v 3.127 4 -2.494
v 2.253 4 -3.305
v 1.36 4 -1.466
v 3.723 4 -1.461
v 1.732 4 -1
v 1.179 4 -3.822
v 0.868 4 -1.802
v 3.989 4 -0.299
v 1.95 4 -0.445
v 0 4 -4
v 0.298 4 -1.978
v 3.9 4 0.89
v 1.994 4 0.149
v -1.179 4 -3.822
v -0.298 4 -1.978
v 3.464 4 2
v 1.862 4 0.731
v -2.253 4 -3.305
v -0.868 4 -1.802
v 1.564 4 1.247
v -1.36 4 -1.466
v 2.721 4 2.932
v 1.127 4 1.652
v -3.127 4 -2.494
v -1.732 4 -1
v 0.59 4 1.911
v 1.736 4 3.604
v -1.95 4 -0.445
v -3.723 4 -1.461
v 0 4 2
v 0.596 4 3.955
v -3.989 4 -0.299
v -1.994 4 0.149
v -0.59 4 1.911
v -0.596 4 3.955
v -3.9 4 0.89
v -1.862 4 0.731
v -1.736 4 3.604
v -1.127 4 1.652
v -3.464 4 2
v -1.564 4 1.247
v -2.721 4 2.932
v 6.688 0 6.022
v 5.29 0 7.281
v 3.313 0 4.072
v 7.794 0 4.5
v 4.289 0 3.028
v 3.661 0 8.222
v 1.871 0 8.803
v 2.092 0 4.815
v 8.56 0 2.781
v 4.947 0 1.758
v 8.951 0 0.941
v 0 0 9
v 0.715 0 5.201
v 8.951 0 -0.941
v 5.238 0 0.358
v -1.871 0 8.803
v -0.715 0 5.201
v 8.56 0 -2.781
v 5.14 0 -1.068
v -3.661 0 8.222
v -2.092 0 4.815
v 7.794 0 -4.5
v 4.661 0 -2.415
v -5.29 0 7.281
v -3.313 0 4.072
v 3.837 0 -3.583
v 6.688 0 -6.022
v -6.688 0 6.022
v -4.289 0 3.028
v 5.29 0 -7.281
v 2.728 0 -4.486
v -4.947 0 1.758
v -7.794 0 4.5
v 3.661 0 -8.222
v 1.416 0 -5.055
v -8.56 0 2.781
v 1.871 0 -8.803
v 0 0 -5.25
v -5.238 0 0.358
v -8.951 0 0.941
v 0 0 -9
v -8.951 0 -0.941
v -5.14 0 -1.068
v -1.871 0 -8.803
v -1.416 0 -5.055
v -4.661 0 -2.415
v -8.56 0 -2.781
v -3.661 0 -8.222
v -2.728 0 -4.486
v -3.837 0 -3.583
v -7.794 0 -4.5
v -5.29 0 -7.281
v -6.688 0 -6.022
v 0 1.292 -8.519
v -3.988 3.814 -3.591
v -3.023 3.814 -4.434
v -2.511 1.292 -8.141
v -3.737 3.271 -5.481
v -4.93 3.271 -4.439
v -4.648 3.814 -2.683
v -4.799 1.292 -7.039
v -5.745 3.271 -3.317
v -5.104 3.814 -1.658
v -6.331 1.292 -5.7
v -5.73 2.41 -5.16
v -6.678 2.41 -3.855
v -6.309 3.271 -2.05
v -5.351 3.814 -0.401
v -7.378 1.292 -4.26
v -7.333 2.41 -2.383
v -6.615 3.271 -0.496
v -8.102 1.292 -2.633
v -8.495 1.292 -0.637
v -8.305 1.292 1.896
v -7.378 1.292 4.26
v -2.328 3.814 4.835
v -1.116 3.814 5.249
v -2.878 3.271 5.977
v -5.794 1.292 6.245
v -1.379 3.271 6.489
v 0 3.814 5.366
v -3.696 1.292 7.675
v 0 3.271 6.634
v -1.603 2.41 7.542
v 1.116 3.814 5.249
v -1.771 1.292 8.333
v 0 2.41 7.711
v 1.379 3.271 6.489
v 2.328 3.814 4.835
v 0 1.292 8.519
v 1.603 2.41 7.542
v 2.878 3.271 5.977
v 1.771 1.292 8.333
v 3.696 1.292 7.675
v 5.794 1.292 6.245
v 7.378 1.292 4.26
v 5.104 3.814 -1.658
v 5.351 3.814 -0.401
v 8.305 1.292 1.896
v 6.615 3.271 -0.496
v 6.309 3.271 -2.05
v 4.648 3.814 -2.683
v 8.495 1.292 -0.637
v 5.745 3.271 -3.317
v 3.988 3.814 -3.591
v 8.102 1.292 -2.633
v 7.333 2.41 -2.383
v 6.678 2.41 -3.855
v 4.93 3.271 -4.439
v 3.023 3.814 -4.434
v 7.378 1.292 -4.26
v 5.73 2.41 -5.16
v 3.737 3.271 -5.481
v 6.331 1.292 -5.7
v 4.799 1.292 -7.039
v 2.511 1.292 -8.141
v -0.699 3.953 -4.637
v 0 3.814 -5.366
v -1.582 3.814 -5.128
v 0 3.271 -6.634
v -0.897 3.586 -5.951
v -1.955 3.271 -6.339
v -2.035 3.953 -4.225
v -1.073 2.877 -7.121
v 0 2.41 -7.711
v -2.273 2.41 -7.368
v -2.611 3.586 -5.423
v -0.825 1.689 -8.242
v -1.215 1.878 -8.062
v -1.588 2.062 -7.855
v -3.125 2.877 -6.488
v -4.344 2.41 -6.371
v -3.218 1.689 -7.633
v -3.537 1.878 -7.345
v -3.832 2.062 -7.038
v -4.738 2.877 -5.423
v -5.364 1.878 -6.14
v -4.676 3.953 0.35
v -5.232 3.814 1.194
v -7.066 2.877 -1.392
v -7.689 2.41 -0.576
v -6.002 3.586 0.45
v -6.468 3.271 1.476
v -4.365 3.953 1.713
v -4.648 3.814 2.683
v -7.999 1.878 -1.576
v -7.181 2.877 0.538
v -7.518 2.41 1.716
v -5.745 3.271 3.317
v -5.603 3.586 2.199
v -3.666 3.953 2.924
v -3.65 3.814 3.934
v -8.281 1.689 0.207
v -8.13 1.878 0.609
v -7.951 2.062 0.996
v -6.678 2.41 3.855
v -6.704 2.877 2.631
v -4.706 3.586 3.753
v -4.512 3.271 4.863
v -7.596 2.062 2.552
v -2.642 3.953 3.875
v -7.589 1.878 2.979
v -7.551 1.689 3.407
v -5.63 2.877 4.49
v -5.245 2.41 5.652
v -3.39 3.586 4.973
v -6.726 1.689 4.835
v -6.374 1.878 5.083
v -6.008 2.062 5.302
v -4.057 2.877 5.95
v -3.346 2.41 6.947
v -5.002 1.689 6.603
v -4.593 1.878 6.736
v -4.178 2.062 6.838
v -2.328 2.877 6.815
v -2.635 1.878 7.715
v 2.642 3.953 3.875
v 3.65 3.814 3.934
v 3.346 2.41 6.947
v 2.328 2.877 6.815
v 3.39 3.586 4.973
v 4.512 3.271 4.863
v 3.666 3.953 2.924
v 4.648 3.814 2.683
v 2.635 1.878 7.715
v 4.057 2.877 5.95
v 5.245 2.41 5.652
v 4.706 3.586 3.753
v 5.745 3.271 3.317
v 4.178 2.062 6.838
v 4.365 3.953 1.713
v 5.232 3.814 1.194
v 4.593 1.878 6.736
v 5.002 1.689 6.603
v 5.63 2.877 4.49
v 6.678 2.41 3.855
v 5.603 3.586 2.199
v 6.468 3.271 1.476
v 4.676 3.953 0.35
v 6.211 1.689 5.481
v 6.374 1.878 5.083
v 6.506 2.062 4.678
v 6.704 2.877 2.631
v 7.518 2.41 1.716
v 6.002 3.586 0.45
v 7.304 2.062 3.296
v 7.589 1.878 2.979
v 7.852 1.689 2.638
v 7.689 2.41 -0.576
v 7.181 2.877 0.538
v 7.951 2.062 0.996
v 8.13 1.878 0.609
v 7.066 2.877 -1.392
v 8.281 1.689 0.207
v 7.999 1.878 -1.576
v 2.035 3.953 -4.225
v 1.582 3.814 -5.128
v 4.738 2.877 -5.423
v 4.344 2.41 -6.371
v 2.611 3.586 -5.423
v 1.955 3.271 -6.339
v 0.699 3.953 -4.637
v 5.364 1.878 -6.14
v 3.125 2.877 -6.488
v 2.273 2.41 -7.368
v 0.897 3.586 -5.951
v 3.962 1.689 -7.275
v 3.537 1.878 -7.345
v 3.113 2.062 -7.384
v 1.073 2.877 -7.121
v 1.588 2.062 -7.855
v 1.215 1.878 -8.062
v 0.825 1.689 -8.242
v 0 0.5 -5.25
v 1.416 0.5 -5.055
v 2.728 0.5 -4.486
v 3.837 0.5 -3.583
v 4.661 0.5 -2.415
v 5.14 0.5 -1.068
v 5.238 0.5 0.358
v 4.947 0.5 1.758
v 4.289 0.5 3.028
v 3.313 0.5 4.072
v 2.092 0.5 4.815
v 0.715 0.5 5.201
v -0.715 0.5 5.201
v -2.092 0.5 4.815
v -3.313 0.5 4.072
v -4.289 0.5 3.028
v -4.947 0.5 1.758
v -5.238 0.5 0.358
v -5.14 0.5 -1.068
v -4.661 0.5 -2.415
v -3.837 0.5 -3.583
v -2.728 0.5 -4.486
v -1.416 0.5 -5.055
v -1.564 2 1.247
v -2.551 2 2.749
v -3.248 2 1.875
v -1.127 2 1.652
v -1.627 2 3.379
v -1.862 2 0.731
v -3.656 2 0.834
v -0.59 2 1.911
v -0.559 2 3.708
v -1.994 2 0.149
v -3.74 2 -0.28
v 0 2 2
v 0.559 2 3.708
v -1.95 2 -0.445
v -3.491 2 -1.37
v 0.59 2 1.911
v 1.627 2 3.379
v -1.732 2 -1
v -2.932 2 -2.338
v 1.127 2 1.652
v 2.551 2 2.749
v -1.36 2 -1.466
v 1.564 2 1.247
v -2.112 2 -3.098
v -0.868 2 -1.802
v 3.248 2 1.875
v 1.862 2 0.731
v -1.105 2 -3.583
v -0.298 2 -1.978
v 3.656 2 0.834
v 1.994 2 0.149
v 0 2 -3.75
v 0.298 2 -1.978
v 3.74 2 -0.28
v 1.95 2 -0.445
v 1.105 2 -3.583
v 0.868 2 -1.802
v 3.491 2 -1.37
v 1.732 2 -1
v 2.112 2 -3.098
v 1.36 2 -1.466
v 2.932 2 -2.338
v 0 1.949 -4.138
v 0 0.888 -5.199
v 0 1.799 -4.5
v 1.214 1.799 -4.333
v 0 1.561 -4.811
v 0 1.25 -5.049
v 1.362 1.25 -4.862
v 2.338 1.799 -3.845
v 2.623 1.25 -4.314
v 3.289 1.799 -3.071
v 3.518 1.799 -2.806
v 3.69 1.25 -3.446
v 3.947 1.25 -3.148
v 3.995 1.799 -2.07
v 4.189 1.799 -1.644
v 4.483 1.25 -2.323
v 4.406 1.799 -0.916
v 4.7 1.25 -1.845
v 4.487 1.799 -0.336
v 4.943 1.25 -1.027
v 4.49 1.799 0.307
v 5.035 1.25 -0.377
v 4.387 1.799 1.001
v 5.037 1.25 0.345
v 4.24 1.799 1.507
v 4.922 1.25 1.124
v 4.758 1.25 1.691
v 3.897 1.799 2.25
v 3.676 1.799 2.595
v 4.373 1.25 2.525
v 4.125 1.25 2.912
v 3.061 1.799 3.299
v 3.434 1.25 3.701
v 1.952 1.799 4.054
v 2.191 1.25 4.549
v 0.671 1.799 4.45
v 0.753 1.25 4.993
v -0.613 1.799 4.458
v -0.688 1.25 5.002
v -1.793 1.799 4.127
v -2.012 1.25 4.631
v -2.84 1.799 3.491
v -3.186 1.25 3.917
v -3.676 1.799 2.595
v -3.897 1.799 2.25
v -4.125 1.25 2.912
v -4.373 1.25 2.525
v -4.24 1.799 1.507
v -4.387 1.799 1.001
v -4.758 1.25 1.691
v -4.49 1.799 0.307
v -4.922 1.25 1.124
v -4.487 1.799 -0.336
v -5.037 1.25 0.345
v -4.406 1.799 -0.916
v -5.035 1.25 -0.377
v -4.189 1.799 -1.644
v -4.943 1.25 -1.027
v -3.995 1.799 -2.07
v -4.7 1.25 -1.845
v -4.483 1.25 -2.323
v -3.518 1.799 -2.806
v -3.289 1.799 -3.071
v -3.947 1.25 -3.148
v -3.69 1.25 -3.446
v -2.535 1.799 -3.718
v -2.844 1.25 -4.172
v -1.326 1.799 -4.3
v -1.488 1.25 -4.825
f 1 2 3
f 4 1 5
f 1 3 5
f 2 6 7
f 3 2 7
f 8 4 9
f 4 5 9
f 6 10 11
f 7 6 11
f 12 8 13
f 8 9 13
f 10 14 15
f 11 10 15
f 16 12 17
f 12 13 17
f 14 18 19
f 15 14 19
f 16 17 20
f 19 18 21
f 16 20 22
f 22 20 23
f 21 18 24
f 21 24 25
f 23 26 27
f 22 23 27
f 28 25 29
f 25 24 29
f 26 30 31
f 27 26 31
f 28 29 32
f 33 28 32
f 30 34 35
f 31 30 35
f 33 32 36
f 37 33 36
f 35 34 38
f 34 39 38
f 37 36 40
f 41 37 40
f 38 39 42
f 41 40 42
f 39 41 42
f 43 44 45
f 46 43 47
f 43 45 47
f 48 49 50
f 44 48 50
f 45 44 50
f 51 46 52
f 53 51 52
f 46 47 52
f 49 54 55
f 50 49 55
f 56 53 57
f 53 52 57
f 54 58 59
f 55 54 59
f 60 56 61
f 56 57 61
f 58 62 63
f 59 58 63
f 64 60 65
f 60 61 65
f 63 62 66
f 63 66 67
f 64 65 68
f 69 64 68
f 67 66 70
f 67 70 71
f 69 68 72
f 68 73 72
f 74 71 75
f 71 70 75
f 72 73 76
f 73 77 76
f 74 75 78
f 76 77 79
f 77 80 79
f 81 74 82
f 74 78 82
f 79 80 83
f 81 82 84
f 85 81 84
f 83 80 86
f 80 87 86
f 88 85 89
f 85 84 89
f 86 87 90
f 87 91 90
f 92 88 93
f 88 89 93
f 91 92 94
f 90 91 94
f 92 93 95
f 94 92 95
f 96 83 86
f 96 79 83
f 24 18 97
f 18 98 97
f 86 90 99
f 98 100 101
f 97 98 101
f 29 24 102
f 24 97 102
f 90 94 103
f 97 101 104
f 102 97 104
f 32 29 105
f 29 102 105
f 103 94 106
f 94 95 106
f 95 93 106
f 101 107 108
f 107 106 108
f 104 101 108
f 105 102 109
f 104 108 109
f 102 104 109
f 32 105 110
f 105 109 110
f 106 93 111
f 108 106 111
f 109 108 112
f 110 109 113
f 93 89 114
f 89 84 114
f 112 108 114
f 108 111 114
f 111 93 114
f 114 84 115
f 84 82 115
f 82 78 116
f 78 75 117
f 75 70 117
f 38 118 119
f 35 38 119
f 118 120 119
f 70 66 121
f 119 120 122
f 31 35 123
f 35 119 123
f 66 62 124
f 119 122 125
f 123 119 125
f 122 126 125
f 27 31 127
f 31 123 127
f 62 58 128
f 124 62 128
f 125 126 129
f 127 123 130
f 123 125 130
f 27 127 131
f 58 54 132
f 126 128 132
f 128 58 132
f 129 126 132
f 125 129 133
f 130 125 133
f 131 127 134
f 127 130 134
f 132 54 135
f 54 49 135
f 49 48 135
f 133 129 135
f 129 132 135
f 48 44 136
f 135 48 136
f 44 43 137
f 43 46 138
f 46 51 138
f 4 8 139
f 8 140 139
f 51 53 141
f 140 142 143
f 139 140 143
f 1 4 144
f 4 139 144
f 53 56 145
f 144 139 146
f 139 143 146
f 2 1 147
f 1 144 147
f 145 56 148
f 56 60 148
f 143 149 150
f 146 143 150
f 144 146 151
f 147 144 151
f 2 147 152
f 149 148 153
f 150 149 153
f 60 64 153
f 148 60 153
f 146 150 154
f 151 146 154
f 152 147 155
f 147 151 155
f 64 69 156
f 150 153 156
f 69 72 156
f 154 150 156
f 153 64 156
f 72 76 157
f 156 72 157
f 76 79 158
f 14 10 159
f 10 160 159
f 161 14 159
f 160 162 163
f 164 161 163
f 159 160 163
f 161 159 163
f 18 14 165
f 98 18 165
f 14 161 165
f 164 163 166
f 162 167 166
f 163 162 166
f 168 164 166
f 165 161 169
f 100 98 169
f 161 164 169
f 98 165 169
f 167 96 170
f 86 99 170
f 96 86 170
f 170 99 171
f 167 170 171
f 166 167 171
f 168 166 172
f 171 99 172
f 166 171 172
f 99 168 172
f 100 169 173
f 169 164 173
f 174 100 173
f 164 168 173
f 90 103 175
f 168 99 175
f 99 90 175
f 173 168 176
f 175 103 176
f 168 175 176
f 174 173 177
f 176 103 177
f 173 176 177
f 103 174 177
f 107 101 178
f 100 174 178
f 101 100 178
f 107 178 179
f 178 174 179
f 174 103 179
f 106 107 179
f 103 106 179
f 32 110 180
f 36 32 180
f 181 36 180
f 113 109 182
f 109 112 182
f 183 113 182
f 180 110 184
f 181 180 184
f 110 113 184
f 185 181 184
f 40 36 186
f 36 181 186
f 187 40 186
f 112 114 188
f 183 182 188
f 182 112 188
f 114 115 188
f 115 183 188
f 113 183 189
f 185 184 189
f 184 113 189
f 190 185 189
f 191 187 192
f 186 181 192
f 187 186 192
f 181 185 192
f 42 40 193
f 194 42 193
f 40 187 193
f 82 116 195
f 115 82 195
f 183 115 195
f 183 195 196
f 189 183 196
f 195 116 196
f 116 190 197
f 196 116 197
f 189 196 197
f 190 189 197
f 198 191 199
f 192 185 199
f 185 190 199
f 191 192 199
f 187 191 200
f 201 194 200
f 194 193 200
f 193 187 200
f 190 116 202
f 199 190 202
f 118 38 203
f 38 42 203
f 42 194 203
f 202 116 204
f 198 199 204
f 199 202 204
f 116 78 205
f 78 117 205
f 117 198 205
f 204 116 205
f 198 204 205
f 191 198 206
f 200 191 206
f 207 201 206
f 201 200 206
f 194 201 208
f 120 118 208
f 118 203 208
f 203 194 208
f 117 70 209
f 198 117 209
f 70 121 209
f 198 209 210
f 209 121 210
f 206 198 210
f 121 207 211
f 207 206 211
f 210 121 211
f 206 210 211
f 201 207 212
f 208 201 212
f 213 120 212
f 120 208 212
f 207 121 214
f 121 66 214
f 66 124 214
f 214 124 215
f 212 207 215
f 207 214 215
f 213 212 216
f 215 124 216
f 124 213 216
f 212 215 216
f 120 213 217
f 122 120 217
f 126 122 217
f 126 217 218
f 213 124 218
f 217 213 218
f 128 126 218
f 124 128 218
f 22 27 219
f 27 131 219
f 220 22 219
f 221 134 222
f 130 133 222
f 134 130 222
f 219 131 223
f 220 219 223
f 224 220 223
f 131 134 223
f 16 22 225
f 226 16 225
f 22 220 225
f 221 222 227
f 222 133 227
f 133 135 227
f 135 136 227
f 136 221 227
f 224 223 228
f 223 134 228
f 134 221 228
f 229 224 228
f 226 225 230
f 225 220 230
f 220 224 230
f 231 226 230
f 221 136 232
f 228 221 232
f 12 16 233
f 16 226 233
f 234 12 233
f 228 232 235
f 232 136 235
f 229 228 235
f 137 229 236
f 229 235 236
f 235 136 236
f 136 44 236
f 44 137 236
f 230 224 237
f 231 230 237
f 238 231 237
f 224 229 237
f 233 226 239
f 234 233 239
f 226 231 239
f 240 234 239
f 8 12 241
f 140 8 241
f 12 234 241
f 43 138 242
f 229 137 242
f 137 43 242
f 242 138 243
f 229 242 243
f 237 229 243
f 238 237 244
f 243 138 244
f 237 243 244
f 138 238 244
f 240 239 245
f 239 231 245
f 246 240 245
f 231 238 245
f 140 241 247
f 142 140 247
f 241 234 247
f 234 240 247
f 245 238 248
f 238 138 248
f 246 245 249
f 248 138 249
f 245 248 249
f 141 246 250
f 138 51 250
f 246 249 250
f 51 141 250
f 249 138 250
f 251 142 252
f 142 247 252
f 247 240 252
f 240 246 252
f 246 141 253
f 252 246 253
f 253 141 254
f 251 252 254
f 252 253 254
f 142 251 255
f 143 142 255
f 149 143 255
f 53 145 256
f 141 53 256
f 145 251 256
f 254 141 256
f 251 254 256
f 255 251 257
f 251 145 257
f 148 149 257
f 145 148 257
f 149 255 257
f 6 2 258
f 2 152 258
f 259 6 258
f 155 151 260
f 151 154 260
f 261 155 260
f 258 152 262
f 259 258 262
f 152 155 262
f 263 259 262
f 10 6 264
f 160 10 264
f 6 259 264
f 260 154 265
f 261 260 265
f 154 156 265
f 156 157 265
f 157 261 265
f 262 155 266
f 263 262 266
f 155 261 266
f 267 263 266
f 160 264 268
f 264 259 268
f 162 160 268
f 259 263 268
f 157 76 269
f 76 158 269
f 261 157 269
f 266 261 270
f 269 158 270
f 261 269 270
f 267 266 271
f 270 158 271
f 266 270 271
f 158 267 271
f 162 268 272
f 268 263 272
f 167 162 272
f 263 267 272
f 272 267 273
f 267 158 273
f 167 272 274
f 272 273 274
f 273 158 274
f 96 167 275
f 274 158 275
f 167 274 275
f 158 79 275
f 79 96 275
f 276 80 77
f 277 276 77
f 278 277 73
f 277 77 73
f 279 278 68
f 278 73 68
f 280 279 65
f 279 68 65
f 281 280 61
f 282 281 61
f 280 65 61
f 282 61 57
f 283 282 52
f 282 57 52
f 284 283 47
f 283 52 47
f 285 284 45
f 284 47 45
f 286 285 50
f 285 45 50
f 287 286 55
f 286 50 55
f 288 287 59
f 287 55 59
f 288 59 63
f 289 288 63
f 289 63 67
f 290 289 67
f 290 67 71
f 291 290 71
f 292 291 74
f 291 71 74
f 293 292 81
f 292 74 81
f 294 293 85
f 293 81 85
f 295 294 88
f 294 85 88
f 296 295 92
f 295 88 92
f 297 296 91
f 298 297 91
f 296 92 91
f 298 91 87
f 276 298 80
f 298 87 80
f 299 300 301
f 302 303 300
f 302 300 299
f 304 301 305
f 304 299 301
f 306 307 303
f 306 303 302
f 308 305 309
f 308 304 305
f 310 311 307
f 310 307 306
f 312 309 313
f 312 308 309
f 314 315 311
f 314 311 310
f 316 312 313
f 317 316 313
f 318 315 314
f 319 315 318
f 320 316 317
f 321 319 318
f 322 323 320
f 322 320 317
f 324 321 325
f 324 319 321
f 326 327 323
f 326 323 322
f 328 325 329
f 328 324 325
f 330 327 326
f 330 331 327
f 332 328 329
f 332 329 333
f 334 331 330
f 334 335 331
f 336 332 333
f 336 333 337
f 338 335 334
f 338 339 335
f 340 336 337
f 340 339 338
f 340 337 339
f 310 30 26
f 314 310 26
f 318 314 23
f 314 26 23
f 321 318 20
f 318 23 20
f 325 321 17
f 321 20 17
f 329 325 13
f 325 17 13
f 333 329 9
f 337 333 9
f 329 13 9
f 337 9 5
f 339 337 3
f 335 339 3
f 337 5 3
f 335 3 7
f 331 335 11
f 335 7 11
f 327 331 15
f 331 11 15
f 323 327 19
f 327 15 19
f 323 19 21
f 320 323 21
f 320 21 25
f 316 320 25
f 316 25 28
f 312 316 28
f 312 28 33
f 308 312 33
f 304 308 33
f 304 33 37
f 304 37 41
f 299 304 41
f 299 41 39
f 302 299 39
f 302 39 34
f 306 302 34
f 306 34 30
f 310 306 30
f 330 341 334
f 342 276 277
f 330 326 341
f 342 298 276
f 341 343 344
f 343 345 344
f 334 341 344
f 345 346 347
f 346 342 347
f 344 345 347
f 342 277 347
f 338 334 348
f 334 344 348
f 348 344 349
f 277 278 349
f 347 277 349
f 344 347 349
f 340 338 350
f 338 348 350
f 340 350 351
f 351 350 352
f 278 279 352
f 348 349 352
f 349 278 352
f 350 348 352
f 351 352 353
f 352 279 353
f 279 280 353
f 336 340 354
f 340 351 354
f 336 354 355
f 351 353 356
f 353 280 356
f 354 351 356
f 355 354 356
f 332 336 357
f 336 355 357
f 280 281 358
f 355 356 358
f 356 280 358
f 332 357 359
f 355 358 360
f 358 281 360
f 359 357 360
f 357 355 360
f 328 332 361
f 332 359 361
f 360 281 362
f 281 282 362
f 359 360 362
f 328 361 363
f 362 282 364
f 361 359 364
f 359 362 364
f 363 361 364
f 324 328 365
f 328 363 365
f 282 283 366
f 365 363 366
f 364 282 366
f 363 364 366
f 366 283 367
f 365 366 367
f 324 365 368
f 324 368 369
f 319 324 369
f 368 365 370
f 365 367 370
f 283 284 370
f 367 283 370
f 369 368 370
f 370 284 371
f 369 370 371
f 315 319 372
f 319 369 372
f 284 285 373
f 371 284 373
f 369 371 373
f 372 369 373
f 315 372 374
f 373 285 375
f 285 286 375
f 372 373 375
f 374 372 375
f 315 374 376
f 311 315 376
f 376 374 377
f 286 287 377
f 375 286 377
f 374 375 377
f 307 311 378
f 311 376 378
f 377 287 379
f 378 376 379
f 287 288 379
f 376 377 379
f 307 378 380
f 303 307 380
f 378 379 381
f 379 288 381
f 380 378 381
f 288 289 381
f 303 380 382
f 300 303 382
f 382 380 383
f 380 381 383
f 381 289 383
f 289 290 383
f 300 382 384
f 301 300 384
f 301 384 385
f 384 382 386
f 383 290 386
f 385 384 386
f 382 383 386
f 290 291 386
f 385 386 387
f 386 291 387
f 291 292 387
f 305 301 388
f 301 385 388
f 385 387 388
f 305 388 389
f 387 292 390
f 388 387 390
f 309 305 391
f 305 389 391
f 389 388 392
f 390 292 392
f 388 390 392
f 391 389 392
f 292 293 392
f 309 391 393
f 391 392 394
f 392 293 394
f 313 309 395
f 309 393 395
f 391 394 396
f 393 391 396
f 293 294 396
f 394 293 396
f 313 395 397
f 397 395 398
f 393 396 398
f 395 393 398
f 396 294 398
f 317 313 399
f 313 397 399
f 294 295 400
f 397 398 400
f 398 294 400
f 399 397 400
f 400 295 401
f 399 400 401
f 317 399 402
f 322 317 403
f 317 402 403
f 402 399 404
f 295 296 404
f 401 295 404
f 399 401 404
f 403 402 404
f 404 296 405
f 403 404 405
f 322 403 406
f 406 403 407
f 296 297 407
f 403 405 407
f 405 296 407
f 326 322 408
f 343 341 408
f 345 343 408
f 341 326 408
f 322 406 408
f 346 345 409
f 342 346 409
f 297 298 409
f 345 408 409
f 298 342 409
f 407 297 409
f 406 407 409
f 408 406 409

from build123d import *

# Parameters (mm, degrees)
ESBO_O2_R             = 2
CORTE_EXTRUS_O1_DEPTH = 10
ESBO_O3_R             = 5.25
CORTE_EXTRUS_O2_DEPTH = 2
FILETE1_R             = 1.5


with BuildPart() as part:
    # Esboço1 → Revolução1 (revolve)
    with BuildSketch(Plane.XY, mode=Mode.PRIVATE) as revolu_o1_sk:
        with BuildLine():
            Line((0, 0), (0, 4))
            Line((0, 4), (4, 4))
            ThreePointArc((4, 4), (7.201562119, 2.876952648), (9, 0))
            Line((9, 0), (0, 0))
        make_face()
    revolve(revolu_o1_sk.sketch.rotate(Axis((0, 0, 0), (0, 1, 0)), 90), axis=Axis((0, 0, 0), (0, 1, 0)))

    # Esboço2 → Corte-extrusão1 (cut)
    with BuildSketch(Plane(origin=(0, 4, 0), x_dir=(1, 0, 0), z_dir=(0, 1, 0))):
        with Locations(Location((0, 0, 0), (0, 0, 270))):
            Circle(ESBO_O2_R)
    extrude(amount=-CORTE_EXTRUS_O1_DEPTH, mode=Mode.SUBTRACT)

    # Esboço3 → Corte-extrusão2 (cut)
    with BuildSketch(Plane.XZ):
        with Locations(Location((0, 0, 0), (0, 0, 270))):
            Circle(ESBO_O3_R)
    extrude(amount=-CORTE_EXTRUS_O2_DEPTH, mode=Mode.SUBTRACT)

    # Filete1
    filete1_edges = [part.edges().sort_by_distance(p)[0] for p in [
        (0, 2, 5.25),
    ]]
    fillet(filete1_edges, radius=FILETE1_R)


solid = part.part
